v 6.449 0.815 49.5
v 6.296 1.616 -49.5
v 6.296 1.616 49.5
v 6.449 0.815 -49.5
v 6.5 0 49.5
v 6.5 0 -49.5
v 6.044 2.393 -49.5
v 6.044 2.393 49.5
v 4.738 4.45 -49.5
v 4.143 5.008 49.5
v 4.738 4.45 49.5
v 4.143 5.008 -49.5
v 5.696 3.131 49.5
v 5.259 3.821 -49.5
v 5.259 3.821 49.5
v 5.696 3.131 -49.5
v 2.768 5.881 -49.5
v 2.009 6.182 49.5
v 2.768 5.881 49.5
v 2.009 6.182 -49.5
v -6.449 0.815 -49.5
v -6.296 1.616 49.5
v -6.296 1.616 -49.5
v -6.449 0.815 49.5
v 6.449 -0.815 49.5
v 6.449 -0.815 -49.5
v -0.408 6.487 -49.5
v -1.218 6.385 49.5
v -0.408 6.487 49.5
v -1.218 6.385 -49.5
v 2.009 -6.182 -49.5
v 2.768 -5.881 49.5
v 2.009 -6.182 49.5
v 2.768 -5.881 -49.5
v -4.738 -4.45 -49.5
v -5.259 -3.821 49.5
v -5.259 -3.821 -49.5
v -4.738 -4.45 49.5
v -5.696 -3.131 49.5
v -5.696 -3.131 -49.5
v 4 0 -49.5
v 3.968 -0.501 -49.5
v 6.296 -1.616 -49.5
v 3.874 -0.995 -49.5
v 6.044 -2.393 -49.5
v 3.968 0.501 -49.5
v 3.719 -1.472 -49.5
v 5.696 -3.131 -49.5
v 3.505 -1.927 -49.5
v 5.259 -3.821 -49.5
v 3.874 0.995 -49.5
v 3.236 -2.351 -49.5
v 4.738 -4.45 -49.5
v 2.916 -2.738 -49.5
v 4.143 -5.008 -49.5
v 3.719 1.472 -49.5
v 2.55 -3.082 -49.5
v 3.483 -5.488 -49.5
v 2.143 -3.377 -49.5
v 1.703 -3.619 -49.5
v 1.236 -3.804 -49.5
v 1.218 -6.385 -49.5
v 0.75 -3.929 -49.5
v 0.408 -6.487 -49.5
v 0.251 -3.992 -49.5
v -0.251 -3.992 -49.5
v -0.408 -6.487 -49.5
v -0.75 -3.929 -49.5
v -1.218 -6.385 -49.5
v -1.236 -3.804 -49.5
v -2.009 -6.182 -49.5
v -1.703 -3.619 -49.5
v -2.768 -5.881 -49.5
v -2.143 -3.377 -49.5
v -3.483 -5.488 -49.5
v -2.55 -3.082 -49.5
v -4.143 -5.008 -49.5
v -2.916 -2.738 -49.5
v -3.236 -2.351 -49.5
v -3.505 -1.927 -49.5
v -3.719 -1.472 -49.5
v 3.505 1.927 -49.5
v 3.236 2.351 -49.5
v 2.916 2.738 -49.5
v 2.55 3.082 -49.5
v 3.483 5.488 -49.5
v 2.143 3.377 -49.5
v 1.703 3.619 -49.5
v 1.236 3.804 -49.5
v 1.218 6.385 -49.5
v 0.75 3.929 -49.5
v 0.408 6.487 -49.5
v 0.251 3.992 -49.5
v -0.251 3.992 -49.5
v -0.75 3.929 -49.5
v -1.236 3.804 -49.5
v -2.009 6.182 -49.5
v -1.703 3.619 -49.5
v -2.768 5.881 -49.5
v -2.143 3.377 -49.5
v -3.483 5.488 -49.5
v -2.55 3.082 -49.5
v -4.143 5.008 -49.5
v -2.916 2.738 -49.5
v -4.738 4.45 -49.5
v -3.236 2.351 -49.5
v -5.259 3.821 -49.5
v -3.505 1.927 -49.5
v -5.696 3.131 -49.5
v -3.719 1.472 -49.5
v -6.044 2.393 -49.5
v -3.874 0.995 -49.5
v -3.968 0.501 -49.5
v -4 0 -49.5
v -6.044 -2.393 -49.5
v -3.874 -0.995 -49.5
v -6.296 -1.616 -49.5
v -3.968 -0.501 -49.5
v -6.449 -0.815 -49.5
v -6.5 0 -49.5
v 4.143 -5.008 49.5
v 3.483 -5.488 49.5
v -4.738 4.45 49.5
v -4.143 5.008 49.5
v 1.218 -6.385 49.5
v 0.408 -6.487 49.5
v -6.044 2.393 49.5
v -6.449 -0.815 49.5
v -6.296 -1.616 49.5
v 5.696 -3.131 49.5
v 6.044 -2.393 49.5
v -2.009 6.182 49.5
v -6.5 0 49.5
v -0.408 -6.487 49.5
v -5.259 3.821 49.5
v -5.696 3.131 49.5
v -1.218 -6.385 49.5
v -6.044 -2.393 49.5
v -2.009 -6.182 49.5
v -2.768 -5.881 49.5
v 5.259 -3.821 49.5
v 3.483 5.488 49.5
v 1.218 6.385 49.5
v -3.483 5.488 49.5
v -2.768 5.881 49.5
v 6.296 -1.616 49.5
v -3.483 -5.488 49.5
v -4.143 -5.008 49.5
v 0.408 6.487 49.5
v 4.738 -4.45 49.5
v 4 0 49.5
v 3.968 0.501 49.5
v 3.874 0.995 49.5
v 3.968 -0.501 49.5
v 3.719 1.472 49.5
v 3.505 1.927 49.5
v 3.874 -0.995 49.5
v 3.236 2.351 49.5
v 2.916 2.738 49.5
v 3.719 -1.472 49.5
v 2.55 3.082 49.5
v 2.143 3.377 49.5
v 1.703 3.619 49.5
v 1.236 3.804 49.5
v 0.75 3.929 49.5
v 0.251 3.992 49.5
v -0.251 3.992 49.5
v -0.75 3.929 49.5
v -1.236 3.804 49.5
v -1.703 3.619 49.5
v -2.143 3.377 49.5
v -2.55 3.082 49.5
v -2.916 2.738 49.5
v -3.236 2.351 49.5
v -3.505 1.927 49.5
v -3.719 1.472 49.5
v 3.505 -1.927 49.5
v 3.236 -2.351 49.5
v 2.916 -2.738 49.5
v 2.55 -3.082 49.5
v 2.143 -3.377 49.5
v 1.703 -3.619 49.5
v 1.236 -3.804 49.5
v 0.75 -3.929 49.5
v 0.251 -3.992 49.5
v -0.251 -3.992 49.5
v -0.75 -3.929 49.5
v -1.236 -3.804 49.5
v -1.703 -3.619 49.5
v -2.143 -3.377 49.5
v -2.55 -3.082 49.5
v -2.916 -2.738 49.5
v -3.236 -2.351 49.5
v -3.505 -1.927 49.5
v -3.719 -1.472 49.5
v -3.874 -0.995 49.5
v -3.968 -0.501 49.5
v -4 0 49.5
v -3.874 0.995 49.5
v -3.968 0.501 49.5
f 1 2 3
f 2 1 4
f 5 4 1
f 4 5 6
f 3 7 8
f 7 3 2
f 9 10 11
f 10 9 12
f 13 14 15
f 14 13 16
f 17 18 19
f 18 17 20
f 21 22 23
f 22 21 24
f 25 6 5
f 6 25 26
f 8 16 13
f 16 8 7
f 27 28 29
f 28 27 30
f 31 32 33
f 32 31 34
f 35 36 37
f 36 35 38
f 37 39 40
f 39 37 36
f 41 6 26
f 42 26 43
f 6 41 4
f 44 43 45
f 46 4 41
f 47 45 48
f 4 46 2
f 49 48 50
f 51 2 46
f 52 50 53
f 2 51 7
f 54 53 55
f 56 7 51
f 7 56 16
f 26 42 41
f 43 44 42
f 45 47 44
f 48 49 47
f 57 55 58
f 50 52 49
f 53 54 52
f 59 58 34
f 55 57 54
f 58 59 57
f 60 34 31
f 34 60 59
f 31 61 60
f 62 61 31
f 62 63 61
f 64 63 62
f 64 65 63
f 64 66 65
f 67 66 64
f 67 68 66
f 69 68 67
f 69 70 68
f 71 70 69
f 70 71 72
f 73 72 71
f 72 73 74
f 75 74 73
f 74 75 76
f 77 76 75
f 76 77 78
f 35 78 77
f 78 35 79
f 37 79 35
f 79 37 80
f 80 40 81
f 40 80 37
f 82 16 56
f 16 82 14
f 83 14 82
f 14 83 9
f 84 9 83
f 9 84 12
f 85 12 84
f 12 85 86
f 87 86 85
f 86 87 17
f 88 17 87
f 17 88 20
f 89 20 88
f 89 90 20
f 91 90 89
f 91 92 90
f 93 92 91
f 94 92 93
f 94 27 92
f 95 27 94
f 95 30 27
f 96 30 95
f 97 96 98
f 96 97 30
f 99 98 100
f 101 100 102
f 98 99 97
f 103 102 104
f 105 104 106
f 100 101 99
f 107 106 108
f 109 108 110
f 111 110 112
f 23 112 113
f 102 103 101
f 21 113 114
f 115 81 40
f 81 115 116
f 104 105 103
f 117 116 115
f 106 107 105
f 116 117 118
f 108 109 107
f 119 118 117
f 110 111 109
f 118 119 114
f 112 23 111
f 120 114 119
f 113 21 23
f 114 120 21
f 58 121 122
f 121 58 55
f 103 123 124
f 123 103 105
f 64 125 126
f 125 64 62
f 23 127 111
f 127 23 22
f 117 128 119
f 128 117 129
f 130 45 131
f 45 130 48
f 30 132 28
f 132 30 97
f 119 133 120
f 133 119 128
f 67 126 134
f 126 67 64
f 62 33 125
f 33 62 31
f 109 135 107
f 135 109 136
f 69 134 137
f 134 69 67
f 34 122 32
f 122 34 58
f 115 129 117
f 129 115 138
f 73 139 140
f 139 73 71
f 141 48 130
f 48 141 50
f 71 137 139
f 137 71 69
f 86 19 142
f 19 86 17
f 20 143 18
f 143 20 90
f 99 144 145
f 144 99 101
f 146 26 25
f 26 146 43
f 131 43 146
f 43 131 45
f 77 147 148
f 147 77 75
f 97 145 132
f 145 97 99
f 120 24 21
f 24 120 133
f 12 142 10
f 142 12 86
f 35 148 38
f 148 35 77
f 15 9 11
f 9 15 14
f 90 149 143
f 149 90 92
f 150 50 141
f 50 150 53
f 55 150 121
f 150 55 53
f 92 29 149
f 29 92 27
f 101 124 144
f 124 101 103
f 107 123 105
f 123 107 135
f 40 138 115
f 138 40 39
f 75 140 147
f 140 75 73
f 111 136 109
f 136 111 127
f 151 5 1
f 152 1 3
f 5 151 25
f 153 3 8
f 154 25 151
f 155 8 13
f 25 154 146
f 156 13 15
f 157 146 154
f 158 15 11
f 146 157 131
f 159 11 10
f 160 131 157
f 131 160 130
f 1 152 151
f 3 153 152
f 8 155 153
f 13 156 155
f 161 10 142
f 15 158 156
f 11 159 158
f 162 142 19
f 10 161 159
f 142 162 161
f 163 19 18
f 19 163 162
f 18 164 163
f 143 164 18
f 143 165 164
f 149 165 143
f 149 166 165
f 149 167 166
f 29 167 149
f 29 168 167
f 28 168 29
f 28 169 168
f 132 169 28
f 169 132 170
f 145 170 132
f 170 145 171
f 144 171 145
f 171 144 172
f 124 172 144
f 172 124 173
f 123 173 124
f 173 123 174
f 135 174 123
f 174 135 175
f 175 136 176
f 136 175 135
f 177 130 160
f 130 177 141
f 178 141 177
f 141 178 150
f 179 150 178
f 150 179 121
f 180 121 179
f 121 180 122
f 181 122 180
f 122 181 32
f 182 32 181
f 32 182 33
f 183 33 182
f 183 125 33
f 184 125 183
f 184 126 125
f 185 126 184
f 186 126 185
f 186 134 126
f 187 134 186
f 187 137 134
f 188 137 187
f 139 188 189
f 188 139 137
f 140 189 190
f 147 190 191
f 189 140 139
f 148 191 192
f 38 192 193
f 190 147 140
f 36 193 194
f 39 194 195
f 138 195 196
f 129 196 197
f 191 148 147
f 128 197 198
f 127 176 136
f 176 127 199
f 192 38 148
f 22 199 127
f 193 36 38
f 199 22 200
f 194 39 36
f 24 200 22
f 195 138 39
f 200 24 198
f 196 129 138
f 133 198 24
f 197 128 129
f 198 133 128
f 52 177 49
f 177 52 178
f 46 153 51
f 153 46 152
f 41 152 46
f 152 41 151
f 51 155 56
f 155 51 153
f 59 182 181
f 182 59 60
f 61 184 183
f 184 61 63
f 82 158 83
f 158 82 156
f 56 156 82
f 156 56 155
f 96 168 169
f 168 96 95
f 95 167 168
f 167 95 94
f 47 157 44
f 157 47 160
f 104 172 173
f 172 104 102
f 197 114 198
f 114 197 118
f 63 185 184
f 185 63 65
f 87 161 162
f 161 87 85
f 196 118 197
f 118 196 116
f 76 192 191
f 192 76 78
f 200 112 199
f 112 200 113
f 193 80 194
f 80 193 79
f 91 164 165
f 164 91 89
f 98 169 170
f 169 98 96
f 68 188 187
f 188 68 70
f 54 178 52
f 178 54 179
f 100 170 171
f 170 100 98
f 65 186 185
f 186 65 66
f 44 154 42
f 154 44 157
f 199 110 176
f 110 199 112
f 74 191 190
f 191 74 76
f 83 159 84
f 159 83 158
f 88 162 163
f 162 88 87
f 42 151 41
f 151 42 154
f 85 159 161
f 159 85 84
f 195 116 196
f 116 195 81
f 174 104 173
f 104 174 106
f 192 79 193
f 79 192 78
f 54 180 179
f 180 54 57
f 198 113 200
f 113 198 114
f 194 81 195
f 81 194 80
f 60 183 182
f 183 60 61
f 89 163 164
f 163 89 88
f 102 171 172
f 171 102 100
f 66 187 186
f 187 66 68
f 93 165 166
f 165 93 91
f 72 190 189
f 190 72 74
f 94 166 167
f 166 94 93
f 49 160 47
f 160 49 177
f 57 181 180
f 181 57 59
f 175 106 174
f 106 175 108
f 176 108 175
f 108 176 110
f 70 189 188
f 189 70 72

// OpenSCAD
$fn = 50;


difference() {
	union() {
		translate(v = [0, 0, -49.5000000000]) {
			cylinder(h = 99, r = 6.5000000000);
		}
	}
	union() {
		translate(v = [0, 0, -100.0000000000]) {
			cylinder(h = 200, r = 4.0000000000);
		}
	}
}
